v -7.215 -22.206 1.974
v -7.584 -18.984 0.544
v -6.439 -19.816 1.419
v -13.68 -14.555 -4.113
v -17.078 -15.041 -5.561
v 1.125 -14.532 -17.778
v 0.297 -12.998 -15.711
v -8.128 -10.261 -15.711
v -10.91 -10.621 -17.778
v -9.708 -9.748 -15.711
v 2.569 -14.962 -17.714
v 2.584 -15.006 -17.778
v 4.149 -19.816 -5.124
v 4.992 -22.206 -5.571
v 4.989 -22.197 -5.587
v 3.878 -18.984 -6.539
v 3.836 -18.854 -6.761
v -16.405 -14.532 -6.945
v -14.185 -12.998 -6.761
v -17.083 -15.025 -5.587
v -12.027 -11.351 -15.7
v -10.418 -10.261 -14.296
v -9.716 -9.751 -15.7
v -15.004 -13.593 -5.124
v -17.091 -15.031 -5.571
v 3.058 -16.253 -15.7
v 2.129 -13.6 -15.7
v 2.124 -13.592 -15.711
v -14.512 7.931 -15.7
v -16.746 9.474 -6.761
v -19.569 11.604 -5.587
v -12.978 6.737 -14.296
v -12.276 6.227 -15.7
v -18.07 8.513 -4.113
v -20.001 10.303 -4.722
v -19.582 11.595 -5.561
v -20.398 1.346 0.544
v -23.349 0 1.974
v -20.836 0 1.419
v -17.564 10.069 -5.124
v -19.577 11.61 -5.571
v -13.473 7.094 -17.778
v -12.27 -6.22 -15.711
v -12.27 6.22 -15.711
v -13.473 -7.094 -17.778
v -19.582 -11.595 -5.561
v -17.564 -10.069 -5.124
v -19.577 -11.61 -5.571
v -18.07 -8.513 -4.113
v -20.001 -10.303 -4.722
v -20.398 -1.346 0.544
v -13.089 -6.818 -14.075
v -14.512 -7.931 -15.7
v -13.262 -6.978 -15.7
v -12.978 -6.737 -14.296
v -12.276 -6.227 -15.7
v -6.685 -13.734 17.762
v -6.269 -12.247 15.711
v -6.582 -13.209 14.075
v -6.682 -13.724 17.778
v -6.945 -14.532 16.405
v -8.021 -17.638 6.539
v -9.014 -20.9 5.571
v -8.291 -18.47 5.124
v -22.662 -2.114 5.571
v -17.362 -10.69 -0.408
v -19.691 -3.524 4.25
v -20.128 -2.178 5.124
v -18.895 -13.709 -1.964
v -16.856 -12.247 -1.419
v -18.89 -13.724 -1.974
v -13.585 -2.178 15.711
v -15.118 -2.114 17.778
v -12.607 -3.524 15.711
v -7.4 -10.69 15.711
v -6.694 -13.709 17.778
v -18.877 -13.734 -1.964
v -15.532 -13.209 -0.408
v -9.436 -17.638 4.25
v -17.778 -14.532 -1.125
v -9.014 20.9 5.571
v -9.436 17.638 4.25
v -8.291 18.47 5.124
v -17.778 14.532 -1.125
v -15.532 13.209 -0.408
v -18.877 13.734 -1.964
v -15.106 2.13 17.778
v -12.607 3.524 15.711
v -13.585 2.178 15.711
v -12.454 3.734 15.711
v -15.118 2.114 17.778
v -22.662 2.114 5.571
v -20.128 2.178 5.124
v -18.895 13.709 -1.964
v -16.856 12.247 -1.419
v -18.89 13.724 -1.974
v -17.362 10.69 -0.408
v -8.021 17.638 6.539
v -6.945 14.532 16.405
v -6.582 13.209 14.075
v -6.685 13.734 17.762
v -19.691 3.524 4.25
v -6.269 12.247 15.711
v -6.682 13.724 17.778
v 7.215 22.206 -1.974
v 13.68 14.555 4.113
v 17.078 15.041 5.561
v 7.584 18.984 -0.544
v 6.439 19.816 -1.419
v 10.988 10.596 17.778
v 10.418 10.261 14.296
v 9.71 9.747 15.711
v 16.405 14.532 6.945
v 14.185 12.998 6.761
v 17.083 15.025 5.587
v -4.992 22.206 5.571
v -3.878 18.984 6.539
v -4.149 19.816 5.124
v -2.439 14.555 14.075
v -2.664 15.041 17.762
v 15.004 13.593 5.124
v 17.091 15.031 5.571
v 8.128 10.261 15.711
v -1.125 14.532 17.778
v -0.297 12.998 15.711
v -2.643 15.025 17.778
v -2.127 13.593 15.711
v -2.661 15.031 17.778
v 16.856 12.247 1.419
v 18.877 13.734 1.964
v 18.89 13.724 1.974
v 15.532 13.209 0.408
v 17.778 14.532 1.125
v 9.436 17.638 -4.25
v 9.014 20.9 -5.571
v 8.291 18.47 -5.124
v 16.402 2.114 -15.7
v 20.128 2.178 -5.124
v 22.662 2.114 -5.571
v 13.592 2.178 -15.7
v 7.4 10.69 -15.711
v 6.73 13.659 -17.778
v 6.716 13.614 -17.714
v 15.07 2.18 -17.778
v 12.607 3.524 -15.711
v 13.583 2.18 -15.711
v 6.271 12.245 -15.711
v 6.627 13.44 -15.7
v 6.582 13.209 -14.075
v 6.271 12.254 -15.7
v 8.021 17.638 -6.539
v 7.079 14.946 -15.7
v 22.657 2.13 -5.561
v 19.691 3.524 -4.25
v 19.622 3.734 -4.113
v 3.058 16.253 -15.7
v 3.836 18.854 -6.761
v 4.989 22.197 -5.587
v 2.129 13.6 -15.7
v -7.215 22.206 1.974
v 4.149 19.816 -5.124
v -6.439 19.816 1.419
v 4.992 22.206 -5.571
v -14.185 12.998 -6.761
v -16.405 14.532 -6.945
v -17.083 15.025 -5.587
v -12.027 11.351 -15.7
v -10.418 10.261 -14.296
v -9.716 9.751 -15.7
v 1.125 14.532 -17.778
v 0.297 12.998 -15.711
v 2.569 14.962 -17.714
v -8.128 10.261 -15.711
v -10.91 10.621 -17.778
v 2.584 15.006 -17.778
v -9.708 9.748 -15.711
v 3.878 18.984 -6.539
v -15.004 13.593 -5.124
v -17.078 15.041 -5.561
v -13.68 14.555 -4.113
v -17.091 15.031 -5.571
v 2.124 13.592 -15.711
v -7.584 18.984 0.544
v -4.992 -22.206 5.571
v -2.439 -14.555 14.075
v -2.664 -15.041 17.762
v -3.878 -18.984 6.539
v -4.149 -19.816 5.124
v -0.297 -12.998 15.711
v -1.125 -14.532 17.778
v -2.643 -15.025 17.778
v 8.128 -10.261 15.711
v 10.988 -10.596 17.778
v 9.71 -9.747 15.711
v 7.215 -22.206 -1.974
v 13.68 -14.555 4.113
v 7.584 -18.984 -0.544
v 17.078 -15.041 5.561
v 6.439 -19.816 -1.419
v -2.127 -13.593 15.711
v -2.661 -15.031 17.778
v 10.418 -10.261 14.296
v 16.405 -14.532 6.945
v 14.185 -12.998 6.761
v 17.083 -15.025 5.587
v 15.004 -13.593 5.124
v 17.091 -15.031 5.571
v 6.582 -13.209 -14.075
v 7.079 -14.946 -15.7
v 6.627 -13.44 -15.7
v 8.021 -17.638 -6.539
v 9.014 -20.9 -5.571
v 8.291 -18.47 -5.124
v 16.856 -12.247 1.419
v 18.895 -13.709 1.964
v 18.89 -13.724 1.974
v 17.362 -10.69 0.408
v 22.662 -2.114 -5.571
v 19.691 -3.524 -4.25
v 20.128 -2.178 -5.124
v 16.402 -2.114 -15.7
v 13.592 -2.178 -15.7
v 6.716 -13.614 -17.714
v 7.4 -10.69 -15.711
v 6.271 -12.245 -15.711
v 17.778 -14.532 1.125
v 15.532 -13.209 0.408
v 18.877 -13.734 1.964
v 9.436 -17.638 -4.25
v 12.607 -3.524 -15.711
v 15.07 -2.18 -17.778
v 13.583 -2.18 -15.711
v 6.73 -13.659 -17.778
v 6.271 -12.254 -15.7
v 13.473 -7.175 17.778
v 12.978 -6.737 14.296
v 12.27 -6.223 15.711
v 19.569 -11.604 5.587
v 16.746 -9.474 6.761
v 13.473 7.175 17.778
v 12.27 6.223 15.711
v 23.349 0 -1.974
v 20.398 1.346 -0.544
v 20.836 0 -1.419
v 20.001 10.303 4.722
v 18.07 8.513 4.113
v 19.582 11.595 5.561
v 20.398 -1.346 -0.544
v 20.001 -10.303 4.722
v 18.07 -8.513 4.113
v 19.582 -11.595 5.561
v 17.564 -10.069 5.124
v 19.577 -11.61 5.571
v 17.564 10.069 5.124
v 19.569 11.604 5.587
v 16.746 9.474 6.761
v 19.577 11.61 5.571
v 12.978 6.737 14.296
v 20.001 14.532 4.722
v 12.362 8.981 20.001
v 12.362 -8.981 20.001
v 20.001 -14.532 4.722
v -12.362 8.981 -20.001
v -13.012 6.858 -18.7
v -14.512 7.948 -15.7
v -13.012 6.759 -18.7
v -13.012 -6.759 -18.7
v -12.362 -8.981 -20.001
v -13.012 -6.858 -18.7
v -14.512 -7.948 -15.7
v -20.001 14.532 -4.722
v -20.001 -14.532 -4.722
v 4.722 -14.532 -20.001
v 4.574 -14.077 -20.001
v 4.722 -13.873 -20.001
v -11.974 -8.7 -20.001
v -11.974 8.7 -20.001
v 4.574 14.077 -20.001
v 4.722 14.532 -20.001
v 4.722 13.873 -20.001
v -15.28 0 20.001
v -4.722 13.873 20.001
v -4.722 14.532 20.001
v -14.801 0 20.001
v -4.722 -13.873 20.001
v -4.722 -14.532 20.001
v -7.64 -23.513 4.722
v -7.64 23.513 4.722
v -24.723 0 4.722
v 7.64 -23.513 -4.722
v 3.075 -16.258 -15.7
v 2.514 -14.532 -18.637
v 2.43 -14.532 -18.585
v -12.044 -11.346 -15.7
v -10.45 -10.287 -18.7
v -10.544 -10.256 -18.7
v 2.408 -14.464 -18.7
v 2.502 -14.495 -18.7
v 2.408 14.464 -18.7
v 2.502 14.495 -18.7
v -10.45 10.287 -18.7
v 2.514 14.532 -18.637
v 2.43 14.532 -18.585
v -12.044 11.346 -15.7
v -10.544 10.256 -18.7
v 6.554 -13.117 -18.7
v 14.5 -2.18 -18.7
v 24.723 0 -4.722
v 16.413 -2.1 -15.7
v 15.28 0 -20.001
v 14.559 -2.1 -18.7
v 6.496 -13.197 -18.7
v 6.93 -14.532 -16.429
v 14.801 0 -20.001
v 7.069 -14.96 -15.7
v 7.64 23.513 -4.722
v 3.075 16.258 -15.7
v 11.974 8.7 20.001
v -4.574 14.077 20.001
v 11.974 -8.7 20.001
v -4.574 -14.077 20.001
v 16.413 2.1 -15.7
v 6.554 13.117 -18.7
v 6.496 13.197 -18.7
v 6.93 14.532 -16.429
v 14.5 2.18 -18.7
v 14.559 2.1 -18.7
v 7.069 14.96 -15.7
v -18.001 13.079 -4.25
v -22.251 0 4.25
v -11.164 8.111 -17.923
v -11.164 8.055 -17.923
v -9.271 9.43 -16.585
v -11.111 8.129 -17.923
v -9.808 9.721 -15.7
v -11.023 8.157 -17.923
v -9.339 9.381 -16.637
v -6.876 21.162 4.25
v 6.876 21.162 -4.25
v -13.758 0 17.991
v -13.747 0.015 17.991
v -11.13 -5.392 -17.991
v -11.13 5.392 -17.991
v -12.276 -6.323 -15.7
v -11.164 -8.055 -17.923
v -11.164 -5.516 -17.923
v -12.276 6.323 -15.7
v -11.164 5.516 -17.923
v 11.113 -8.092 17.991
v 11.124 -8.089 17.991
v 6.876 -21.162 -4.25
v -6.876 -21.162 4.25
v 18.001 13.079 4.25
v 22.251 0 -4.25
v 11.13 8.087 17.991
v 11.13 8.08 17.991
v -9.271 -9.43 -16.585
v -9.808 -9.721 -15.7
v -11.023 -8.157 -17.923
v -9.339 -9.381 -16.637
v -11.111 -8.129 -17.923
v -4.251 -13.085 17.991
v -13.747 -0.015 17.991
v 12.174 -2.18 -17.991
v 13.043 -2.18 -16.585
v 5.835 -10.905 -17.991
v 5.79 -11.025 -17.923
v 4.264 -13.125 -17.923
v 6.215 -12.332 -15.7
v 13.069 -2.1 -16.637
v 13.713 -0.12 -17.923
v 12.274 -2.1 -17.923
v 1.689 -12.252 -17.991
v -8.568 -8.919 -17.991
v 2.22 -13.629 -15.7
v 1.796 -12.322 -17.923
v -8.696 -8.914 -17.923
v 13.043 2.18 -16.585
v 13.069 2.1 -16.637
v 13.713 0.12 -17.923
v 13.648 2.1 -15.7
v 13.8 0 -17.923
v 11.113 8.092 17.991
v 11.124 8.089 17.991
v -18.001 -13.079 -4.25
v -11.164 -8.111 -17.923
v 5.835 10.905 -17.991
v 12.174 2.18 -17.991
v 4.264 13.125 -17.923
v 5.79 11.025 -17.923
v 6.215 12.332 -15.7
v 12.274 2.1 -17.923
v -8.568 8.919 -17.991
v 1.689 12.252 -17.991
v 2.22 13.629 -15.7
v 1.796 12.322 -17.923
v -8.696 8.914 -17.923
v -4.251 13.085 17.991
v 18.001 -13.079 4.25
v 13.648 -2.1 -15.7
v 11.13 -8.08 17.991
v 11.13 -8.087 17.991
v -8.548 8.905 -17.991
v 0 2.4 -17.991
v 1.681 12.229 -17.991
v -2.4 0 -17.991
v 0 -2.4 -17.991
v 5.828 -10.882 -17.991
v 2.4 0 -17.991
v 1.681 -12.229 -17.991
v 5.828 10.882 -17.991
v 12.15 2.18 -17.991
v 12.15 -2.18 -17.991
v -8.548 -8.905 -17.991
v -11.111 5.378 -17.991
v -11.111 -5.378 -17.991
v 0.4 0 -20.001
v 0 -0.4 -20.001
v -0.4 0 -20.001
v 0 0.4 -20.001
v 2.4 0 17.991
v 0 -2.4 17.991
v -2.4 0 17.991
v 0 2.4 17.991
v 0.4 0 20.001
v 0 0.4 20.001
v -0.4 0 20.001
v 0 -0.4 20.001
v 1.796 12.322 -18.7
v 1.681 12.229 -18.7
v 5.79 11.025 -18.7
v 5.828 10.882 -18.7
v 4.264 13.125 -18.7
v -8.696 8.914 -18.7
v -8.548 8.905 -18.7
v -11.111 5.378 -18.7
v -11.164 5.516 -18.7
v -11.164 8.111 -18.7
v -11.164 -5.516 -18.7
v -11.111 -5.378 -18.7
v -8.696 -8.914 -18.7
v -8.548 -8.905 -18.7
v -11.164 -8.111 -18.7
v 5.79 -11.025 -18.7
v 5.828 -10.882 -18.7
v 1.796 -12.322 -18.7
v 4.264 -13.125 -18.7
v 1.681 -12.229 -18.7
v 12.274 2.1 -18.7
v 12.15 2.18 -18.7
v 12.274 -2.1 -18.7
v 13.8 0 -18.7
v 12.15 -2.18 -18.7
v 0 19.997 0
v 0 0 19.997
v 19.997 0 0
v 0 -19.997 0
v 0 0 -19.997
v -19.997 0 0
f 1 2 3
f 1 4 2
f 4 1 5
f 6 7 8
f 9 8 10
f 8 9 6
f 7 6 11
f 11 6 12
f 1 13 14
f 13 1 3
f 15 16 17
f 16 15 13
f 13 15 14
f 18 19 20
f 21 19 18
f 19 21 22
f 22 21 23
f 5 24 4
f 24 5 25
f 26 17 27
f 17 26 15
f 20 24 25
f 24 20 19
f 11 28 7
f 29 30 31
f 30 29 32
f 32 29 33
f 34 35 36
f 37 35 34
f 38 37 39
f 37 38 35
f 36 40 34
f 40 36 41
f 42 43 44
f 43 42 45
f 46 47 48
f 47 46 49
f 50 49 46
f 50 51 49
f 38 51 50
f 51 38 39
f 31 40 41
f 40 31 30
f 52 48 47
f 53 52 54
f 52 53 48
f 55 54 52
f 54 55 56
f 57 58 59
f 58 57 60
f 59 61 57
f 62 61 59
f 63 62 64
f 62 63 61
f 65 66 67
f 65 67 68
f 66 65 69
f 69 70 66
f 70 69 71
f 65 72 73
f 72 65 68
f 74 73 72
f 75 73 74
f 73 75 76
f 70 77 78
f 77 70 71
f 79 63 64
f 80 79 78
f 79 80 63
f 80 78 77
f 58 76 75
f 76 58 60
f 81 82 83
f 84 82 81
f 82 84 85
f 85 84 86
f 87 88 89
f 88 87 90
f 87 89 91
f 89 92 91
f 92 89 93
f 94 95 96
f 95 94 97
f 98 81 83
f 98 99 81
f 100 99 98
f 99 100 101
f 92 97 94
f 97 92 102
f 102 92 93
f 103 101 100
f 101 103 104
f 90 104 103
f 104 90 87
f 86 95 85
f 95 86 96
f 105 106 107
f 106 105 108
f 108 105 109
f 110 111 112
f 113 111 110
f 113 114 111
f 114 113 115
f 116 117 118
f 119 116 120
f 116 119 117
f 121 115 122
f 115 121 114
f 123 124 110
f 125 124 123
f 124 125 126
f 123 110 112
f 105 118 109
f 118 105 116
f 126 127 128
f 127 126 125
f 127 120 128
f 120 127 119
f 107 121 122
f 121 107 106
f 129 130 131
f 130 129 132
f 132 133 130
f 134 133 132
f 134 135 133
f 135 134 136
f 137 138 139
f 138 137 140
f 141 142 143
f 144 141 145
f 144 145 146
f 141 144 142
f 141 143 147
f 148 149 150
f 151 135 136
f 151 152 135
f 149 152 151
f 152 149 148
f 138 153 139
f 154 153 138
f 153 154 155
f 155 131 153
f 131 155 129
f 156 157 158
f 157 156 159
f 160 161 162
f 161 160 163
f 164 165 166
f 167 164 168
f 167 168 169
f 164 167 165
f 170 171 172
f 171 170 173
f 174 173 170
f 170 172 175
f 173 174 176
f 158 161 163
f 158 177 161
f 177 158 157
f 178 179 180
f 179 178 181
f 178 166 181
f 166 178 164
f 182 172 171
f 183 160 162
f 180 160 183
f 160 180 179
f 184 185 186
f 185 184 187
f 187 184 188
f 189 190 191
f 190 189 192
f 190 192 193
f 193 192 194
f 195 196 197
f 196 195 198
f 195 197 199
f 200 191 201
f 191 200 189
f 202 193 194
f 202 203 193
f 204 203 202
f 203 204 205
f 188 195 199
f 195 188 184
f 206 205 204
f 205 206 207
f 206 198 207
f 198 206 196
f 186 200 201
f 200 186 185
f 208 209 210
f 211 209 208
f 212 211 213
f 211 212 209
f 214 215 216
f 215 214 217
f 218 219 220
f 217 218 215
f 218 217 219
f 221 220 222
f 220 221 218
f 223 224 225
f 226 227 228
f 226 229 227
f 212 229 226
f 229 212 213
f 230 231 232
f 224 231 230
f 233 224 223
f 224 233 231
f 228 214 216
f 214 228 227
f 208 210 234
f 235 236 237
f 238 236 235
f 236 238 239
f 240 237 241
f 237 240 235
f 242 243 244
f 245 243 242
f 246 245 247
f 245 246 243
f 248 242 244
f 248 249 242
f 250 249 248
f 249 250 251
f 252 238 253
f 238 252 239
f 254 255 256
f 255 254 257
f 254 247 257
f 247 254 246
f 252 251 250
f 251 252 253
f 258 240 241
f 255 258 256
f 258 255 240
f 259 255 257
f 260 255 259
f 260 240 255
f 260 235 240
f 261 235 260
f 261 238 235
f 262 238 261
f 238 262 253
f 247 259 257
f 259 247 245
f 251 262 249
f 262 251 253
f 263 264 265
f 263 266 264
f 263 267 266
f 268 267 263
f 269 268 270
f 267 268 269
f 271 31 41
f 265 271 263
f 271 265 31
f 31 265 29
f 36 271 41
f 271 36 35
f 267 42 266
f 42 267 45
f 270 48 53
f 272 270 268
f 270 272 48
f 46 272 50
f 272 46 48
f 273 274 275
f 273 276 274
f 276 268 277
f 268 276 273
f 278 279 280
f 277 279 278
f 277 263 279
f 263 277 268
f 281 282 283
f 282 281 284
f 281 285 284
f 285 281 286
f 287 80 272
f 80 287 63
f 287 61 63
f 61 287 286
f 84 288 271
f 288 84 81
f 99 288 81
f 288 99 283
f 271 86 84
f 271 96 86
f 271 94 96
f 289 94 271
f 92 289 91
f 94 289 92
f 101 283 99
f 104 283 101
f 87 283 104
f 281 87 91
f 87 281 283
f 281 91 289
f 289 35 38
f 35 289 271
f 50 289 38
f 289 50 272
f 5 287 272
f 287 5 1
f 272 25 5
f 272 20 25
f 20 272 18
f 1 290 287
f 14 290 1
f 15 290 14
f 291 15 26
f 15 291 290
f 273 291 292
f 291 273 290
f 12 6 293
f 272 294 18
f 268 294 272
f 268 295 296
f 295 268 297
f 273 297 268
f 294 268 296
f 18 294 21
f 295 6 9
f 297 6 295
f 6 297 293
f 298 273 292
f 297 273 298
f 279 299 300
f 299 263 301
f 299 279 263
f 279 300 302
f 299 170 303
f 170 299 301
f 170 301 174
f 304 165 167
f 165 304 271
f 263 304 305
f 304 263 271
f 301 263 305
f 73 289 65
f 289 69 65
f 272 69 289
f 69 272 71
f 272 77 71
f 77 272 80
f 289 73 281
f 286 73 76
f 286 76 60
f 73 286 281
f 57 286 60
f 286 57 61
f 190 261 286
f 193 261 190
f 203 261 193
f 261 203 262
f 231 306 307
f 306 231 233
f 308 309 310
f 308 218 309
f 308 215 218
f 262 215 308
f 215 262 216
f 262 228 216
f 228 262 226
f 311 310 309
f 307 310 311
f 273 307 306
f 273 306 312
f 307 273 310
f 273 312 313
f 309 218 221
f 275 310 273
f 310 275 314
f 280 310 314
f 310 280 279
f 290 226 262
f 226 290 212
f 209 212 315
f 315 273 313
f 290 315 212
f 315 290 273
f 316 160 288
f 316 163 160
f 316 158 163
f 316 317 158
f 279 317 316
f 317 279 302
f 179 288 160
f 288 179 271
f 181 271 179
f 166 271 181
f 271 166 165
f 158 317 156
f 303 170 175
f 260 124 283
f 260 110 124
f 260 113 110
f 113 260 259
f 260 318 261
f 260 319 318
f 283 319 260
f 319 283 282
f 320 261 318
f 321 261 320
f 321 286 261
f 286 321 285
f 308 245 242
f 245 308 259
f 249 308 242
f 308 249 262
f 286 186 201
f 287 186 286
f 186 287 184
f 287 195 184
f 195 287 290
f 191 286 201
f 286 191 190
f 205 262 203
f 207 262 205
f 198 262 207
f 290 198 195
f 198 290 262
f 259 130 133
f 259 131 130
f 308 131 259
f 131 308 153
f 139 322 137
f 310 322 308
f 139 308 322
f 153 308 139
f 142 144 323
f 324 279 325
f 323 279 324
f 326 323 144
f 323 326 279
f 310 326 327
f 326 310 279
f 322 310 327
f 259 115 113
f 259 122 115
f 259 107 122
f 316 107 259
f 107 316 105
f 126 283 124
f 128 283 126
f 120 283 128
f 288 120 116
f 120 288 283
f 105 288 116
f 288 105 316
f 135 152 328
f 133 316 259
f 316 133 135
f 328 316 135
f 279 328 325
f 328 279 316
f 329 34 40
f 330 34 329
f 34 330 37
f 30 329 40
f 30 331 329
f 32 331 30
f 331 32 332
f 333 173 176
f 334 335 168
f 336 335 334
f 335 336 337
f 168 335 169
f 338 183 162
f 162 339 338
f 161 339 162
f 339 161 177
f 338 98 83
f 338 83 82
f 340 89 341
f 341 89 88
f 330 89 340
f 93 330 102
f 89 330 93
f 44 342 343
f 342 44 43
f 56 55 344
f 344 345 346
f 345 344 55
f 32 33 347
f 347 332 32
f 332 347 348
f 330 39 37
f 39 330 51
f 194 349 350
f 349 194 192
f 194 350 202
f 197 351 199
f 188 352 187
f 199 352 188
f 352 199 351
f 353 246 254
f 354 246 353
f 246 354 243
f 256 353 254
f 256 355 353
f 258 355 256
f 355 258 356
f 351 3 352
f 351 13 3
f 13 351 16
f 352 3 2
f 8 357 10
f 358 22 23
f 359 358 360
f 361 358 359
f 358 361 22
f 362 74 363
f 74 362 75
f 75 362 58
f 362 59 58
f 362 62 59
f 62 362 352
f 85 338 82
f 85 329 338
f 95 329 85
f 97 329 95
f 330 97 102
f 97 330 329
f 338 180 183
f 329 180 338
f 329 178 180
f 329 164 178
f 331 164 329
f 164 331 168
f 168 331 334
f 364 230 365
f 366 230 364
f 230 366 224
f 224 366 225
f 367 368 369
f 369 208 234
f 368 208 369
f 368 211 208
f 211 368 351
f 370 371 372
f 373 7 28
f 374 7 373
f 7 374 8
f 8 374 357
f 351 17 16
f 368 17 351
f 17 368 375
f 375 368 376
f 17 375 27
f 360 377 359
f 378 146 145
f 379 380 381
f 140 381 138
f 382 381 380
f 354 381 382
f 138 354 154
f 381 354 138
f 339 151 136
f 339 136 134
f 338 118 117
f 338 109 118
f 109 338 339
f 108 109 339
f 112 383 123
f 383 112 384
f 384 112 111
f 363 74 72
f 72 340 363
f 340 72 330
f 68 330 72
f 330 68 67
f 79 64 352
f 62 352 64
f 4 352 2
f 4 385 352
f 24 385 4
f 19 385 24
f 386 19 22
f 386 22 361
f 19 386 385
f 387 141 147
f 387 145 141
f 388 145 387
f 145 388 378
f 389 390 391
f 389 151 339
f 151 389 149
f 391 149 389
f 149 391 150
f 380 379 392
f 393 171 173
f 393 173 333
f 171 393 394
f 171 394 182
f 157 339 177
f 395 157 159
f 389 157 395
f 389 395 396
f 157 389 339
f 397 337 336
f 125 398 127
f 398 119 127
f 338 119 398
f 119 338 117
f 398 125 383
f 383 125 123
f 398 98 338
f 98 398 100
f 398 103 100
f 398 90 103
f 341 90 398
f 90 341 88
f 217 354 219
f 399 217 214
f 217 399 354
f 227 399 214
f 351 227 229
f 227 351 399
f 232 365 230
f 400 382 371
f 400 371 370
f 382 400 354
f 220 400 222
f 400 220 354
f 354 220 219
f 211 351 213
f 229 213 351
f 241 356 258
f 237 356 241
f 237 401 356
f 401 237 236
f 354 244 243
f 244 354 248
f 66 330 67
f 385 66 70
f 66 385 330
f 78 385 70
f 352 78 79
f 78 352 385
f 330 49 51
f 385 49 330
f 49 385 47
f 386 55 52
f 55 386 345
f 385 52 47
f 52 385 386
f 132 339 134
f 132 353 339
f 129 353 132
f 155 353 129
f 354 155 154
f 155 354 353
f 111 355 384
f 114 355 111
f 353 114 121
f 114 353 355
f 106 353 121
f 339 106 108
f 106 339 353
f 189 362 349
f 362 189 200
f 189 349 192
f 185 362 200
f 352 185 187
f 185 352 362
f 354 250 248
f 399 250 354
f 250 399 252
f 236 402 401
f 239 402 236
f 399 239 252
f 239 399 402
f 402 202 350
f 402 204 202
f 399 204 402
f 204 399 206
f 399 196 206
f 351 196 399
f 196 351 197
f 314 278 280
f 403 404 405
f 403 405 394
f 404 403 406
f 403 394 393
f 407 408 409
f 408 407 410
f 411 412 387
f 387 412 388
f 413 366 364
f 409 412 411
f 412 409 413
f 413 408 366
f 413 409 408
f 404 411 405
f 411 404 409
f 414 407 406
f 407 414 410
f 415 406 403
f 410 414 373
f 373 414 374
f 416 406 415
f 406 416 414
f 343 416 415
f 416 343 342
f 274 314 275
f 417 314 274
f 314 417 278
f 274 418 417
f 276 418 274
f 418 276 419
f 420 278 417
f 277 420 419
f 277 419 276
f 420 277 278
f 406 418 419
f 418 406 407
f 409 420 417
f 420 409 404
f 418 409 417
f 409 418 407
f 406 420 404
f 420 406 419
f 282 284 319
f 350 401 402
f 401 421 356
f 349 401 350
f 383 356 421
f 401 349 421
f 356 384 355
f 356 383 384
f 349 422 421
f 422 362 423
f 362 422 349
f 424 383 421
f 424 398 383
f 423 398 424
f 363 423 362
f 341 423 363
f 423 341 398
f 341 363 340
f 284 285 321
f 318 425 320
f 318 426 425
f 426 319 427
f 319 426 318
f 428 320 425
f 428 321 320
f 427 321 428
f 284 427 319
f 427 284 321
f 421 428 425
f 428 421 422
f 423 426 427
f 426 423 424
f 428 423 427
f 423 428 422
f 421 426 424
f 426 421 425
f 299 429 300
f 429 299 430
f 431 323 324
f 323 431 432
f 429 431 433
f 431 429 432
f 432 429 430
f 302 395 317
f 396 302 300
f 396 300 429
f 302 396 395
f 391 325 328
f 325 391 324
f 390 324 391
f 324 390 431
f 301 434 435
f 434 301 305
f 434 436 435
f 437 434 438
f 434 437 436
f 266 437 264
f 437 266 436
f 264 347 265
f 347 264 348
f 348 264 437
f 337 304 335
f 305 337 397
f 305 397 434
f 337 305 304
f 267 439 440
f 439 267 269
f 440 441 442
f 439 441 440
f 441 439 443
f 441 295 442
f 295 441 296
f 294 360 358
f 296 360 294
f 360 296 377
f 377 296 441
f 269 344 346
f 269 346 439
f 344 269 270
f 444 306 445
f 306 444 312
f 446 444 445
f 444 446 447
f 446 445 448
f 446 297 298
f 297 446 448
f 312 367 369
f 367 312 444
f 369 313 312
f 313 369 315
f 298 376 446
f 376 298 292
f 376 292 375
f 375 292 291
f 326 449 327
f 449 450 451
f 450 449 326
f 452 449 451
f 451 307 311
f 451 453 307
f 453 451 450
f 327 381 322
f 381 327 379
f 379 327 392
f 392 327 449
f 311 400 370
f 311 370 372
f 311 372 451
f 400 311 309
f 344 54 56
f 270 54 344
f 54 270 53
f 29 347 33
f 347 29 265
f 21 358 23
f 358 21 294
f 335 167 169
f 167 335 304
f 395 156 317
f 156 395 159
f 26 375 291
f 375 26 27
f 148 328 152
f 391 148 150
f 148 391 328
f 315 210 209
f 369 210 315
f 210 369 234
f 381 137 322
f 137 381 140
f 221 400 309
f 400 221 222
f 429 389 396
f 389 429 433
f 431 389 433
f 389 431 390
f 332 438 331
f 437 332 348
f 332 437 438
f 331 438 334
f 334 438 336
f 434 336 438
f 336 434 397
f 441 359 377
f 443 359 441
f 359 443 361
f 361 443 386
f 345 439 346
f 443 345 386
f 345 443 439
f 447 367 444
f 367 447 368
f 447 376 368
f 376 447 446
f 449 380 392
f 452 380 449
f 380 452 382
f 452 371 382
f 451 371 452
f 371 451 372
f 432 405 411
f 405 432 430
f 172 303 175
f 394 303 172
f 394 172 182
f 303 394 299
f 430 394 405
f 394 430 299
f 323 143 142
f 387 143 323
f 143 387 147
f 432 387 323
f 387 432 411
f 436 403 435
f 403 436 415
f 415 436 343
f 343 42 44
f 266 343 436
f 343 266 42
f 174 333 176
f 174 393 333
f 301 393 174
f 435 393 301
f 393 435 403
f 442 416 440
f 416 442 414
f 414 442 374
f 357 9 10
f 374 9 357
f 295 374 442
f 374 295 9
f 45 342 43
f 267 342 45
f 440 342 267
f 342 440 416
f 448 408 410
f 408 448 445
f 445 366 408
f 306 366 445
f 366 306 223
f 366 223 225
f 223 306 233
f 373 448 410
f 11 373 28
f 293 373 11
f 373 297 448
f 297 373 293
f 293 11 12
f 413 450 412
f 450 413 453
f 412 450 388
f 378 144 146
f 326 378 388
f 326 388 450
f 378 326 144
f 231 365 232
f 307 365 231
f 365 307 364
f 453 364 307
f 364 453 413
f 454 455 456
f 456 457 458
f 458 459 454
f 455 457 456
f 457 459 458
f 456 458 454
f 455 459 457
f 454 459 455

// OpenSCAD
arete = 28.28;
paroi = 1.5;
echelleReductionAjustementBouchon = 0.965;
r = 0.19; // résolution d'impression sur l'axe Z
octa_sch = [3,4];
Cpi = 3.14159;
Cphi = (1+sqrt(5))/2;
Cepsilon = 0.00000001;

function octa_ext_radius(a) = 
    a/2*(sqrt(2));
    
function octa_int_radius(a) = 
    a/6*sqrt(6);
    
function octa_arete_from(radius) = 
    radius*6/sqrt(6);
    
externalRadius = octa_ext_radius(arete);
internalRadius = octa_ext_radius(
                    octa_arete_from(
                        octa_int_radius(arete)-paroi));
                        
echo(externalRadius);
echo(internalRadius);

rotate([-45, 0, 0])
rotate([0, -90+plat_dihedral(octa_sch)/2, 0])
    octahedron(externalRadius);
//octa_creux();
//decoupe_bouchon();
//corps_ouvert();
//bouchon();
//trou();
dode_top();
dode_bottom();

module corps_ouvert() {
	difference() {
		octa_creux();
		decoupe_bouchon();
	}
}

module bouchon() {
//    rotate([180, 0, 0])
	scale([echelleReductionAjustementBouchon, echelleReductionAjustementBouchon, 0.995])
	difference () {
        intersection() {
            octa_creux();
            decoupe_bouchon(echelleReductionAjustementBouchon);
        }
	}
}

module octa_creux() {
	difference() {
        octahedron(externalRadius);
        octahedron(internalRadius);
	}
}

module decoupe_bouchon(scale=1) {
    distance = octa_int_radius(arete);
	rotate([0,0,60]) translate([0,0, distance])
		cylinder(paroi, r=arete*0.545, $fn=3, center=true);
	rotate([0,0,60]) translate([0,0, distance-paroi+0.4])
		cylinder(paroi-0.4, r=(arete-paroi)*0.523, $fn=3, center=true);
}


module octahedron(rad) {
    // create an instance of a spherical coordinate
    // long - rotation around z -axis
    // lat - latitude, starting at 0 == 'north pole'
    // rad - distance from center
    function sph(long, lat, rad=1) = [long, lat, rad];
    
    // Convert spherical to cartesian
    function sph_to_cart(s) = [
	clean(s[2]*sin(s[1])*cos(s[0])),  

	clean(s[2]*sin(s[1])*sin(s[0])),

	clean(s[2]*cos(s[1]))
	];

    function sphu_from_cart(c, rad=1) = sph(
        atan2(c[1],c[0]), 
        atan2(sqrt(c[0]*c[0]+c[1]*c[1]), c[2]), 
        rad
        );

    octa_cart = [
        [+1, 0, 0],  // + x axis
        [-1, 0, 0],	// - x axis
        [0, +1, 0],	// + y axis
        [0, -1, 0],	// - y axis
        [0, 0, +1],	// + z axis
        [0, 0, -1] 	// - z axis
    ];

    function octa_unit(rad=1) = [
        sph_to_cart(sphu_from_cart(octa_cart[0], rad)), 
        sph_to_cart(sphu_from_cart(octa_cart[1], rad)),
        sph_to_cart(sphu_from_cart(octa_cart[2], rad)),
        sph_to_cart(sphu_from_cart(octa_cart[3], rad)),
        sph_to_cart(sphu_from_cart(octa_cart[4], rad)), 
        sph_to_cart(sphu_from_cart(octa_cart[5], rad)), 
        ];

    octafaces = [
        [4,2,0],
        [4,0,3],
        [4,3,1],
        [4,1,2],
        [5,0,2],
        [5,3,0],
        [5,1,3],
        [5,2,1]
        ];

    octa_edges = [
        [0,2], 
        [0,3],
        [0,4],
        [0,5],
        [1,2],
        [1,3],
        [1,4],
        [1,5],
        [2,4], 
        [2,5],
        [3,4],
        [3,5],
        ];

    function octahedron(rad=1) = [octa_unit(rad), octafaces, octa_edges];

    rotate([0, 90-plat_dihedral(octa_sch)/2, 0])
    rotate([45, 0, 0])
    polyhedron(octa_unit(rad), faces=octafaces);
}
//translate([0, 0, -17.7])
//cylinder(5,40,40);

function clean(n) = (n < 0) ? ((n < -Cepsilon) ? n : 0) : 
	(n < Cepsilon) ? 0 : n; 

function plat_dihedral(pq) = 2 * asin( cos(180/pq[1])/sin(180/pq[0]));

function plat_circumradius(pq, a) = 
	(a/2)*
	tan(Cpi/pq[1])*
	tan(plat_dihedral(pq)/2);

function plat_midradius(pq, a) = 
	(a/2)*
	cos(Cpi/pq[0])*
	tan(plat_dihedral(pq)/2);

function plat_inradius(pq,a) = 
	a/(2*tan(Cpi/pq[0]))*
	sqrt((1-cos(plat_dihedral(pq)))/(1+cos(plat_dihedral(pq))));

function plat_a_from_inradius(pq, inradius) =
    inradius*(2*tan(Cpi/pq[0]))/
	sqrt((1-cos(plat_dihedral(pq)))/(1+cos(plat_dihedral(pq))));




// Dodecahedron

// base coordinates
// source:  http://dmccooey.com/polyhedra/Dodecahedron.txt
// generated by  http://kitwallace.co.uk/3d/solid-to-scad.xq
Name = "Dodecahedron";
// 5 sided faces = 12
C0 = 0.809016994374947424102293417183;
C1 = 1.30901699437494742410229341718;
points = [
[ 0.0,  0.5,   C1],
[ 0.0,  0.5,  -C1],
[ 0.0, -0.5,   C1],
[ 0.0, -0.5,  -C1],
[  C1,  0.0,  0.5],
[  C1,  0.0, -0.5],
[ -C1,  0.0,  0.5],
[ -C1,  0.0, -0.5],
[ 0.5,   C1,  0.0],
[ 0.5,  -C1,  0.0],
[-0.5,   C1,  0.0],
[-0.5,  -C1,  0.0],
[  C0,   C0,   C0],
[  C0,   C0,  -C0],
[  C0,  -C0,   C0],
[  C0,  -C0,  -C0],
[ -C0,   C0,   C0],
[ -C0,   C0,  -C0],
[ -C0,  -C0,   C0],
[ -C0,  -C0,  -C0]];
faces = [
[ 12 ,  4, 14,  2,  0],
[ 16 , 10,  8, 12,  0],
[  2 , 18,  6, 16,  0],
[ 17 , 10, 16,  6,  7],
[ 19 ,  3,  1, 17,  7],
[  6 , 18, 11, 19,  7],
[ 15 ,  3, 19, 11,  9],
[ 14 ,  4,  5, 15,  9],
[ 11 , 18,  2, 14,  9],
[  8 , 10, 17,  1, 13],
[  5 ,  4, 12,  8, 13],
[  1 ,  3, 15,  5, 13]];
edges = [
[4,12],
[4,14],
[2,14],
[0,2],
[0,12],
[10,16],
[8,10],
[8,12],
[0,16],
[2,18],
[6,18],
[6,16],
[10,17],
[6,7],
[7,17],
[3,19],
[1,3],
[1,17],
[7,19],
[11,18],
[11,19],
[3,15],
[9,11],
[9,15],
[4,5],
[5,15],
[9,14],
[1,13],
[8,13],
[5,13]];
// --------------------------------- 


// cut holes out of shell
eps=0.02;
radius=25.17;
shell_ratio=0.1;
prism_base_ratio =0.8;
prism_height_ratio=0.42;
prism_scale=0.5;
nfaces = [];
scale=1;

//insert

spoints = normalize(centre_points(points),radius);
sfaces = lhs_faces(faces,spoints);
cfaces =  select_nsided_faces(sfaces,nfaces);

hauteur = radius_sphere_inscrite(arete_from_sphere_circonscrite(radius))*2;

module base() {
    rotate([0,0,0])
        translate([0,0,-hauteur/2])
    difference() {
        cylinder(r=hauteur*0.37, h=2.01, $fn=5, center=false);
        cylinder(r1=0.4, r2=2.4, h=2.01, $fn=4, center=false);
    }
}

module plafond() {
    rotate([0,180,0]) base();
}

module dode_construct() {
    difference() {
        polyhedron(spoints,sfaces);
        scale(1-shell_ratio) polyhedron(spoints,sfaces);
        face_prisms_in(cfaces,spoints,prism_base_ratio,prism_scale,prism_height_ratio);
    }
}

module dodecahedron() {
scale(scale)
translate([0, 0, -hauteur/2])
 place_on_largest_face(sfaces,spoints)
   dode_construct();
}

module assemblage_dode() {
    union() {
        dodecahedron();
        base();
        plafond();
    }
}
 
module dode_bottom() {
    difference() {        
        assemblage_dode();
        decoupe();
        plots(4.36, 8, 6);
    }
}
 
module dode_top() {
//    rotate([180,0,0])
    difference() {
        intersection() {        
            assemblage_dode();
            union() {
                decoupe();
                plots(4.2, 8, 6);
            }
        }
        for (i = [1:5]) {
          rotate([0, 0, 360/5*i])
            translate([11.3, 0, (-hauteur/2.548)-2.6]) rotate([0,0,0])
                cylinder(d1=5, d2=5, h=5, $fn=5, center=true);
        }
    }
}

module decoupe() {
    translate([0, 0, -hauteur/2.548])
        cylinder(h=666, d=666);
}

module plots(largeur, longueur, h) {
    for (i = [1:5]) {
      rotate([0, 0, 360/5*i])
        translate([16.15, 0, (-hauteur/2.548)-(h/2)]) rotate([0,0,0])
//            cylinder(d1=diam-cone, d2=diam, h=h, $fn=4, center=true);
            linear_extrude(height = 20, scale = 1)
                square([longueur, largeur], center = true);
    }
}

//decoupe();
//dode_top();
//dode_bottom();

function radius_sphere_inscrite(arete) =
    arete*sqrt(5/8+11/(8*sqrt(5)));

function arete_from_sphere_circonscrite(radius) =
    radius*4/(sqrt(3)+sqrt(15));

// ruler(10);

// functions for the construction of polyhedra
// chris wallace
// see http://kitwallace.tumblr.com/tagged/polyhedra for info


//  functions for creating the matrices for transforming a single point

function m_translate(v) = [ [1, 0, 0, 0],
                            [0, 1, 0, 0],
                            [0, 0, 1, 0],
                            [v.x, v.y, v.z, 1  ] ];
                            
function m_rotate(v) =  [ [1,  0,         0,        0],
                          [0,  cos(v.x),  sin(v.x), 0],
                          [0, -sin(v.x),  cos(v.x), 0],
                          [0,  0,         0,        1] ]
                      * [ [ cos(v.y), 0,  -sin(v.y), 0],
                          [0,         1,  0,        0],
                          [ sin(v.y), 0,  cos(v.y), 0],
                          [0,         0,  0,        1] ]
                      * [ [ cos(v.z),  sin(v.z), 0, 0],
                          [-sin(v.z),  cos(v.z), 0, 0],
                          [ 0,         0,        1, 0],
                          [ 0,         0,        0, 1] ];
                            
function vec3(v) = [v.x, v.y, v.z];
function transform(v, m)  = vec3([v.x, v.y, v.z, 1] * m);
                            
function matrix_to(p0, p) = 
                       m_rotate([0, atan2(sqrt(pow(p[0], 2) + pow(p[1], 2)), p[2]), 0]) 
                     * m_rotate([0, 0, atan2(p[1], p[0])]) 
                     * m_translate(p0);

function matrix_from(p0, p) = 
                      m_translate(-p0)
                      * m_rotate([0, 0, -atan2(p[1], p[0])]) 
                      * m_rotate([0, -atan2(sqrt(pow(p[0], 2) + pow(p[1], 2)), p[2]), 0]); 

function transform_points(list, matrix, i = 0) = 
    i < len(list) 
       ? concat([ transform(list[i], matrix) ], transform_points(list, matrix, i + 1))
       : [];


//  convert from point indexes to point coordinates

function as_points(indexes,points,i=0) =
     i < len(indexes) 
        ?  concat([points[indexes[i]]], as_points(indexes,points,i+1))
        : [];

//  basic vector functions
function normal_r(face) =
     cross(face[1]-face[0],face[2]-face[0]);

function normal(face) =
     - normal_r(face) / norm(normal_r(face));

function centre(points) = 
      vsum(points) / len(points);

// sum a list of vectors
function vsum(points,i=0) =  
      i < len(points)
        ?  (points[i] + vsum(points,i+1))
        :  [0,0,0];

function ssum(list,i=0) =  
      i < len(list)
        ?  (list[i] + ssum(list,i+1))
        :  0;


// add a vector to a list of vectors
function vadd(points,v,i=0) =
      i < len(points)
        ?  concat([points[i] + v], vadd(points,v,i+1))
        :  [];

function reverse_r(v,n) =
      n == 0 
        ? [v[0]]
        : concat([v[n]],reverse_r(v,n-1));

function reverse(v) = reverse_r(v, len(v)-1);

function sum_norm(points,i=0) =
    i < len(points)
       ?  norm(points[i]) + sum_norm(points,i+1)
       : 0 ;

function average_radius(points) =
       sum_norm(points) / len(points);


// select one dimension of a list of vectors
function slice(v,k,i=0) =
   i <len(v)
      ?  concat([v[i][k]], slice(v,k,i+1))
      : [];

function max(v, max=-9999999999999999,i=0) =
     i < len(v) 
        ?  v[i] > max 
            ?  max(v, v[i], i+1 )
            :  max(v, max, i+1 ) 
        : max;

function min(v, min=9999999999999999,i=0) =
     i < len(v) 
        ?  v[i] < min 
            ?  min(v, v[i], i+1 )
            :  min(v, min, i+1 ) 
        : min;

function project(pts,i=0) =
     i < len(pts)
        ? concat([[pts[i][0],pts[i][1]]], project(pts,i+1))
        : [];
        
function contains(n, list, i=0) =
     i < len(list) 
        ?  n == list[i]
           ?  true
           :  contains(n,list,i+1)
        : false;

// normalize the points to have origin at 0,0,0 
function centre_points(points) = 
     vadd(points, - centre(points));

//scale to average radius = radius
function normalize(points,radius) =
    points * radius /average_radius(points);
 
function select_nsided_faces(faces,nsides,i=0) =
  len(nsides) == 0
     ?  faces
     :  i < len(faces)
         ?  contains(len(faces[i]), nsides)
             ? concat([faces[i]],  select_nsided_faces(faces,nsides,i+1))
             : select_nsided_faces(faces,nsides,i+1)
         : [];
         
function longest_edge(face,max=-1,i=0) =
       i < len(face)
          ?  norm(face[i] - face[(i+1)% len(face)]) > max
             ?  longest_edge(face, norm(face[i] - face[(i+1)% len(face)]),i+1)
             :  longest_edge(face, max,i+1)
          : max ;

function point_edges(point,edges,i=0) =
    i < len(edges) 
       ? point == edges[i][0] || point == edges[i][1]
         ? concat([edges[i]], point_edges(point,edges,i+1))
         : point_edges(point,edges,i+1)
       : [];

function select_nedged_points(points,edges,nedges,i=0) =
     i < len(points) 
         ?  len(point_edges(i,edges)) == nedges
             ? concat([i],  select_nedged_points(points,edges,nedges,i+1))
             : select_nedged_points(points,edges,nedges,i+1)
         : [];

function triangle(a,b) = norm(cross(a,b))/2;

function face_area_centre(face,centre,i=0) =
    i < len(face)
       ?  triangle(
                face[i] - centre,
                face[(i+1) % len(face)] - centre)
          + face_area_centre(face,centre,i+1)
       : 0 ;

function face_area(face) = face_area_centre(face,centre(face));

function face_areas(faces,points,i=0) =
   i < len(faces)
      ? concat([[i,  face_area(as_points(faces[i],points))]] ,
               face_areas(faces,points,i+1))
      : [] ;
 
function max_area(areas, max=[-1,-1], i=0) =
   i <len(areas)
      ? areas[i][1] > max[1]
         ?  max_area(areas,areas[i],i+1)
         :  max_area(areas,max,i+1)
      : max;


function bbox(v) = [
   [min(slice(spoints,0)), max(slice(spoints,0))],
   [min(slice(spoints,1)), max(slice(spoints,1))],
   [min(slice(spoints,2)), max(slice(spoints,2))]
];

// check that all faces have a lhs orientation
function cosine_between(u, v) =(u * v) / (norm(u) * norm(v));

function lhs_faces(faces,points,i=0) =
     i < len(faces) 
        ?  cosine_between(normal(as_points(faces[i],points)),
                         centre(as_points(faces[i],points))) < 0
            ?  concat([reverse(faces[i])],lhs_faces(faces,points,i+1))
            :  concat([faces[i]],lhs_faces(faces,points,i+1))
        : [] ;


function fs(p) = f(p[0],p[1],p[2]);

function modulate_point(p) =
    spherical_to_xyz(fs(xyz_to_spherical(p)));

function modulate_points(points,i=0) =
   i < len(points)
      ? concat([modulate_point(points[i])],modulate_points(points,i+1))
      : [];

function xyz_to_spherical(p) =
    [ norm(p), acos(p.z/ norm(p)), atan2(p.x,p.y)] ;

function spherical_to_xyz_full(r,theta,phi) =
    [ r * sin(theta) * cos(phi),
      r * sin(theta) * sin(phi),
      r * cos(theta)];

function spherical_to_xyz(s) =
     spherical_to_xyz_full(s[0],s[1],s[2]);

function select_large_faces(faces,points, min,i=0) =
  i < len(faces)
     ?  face_area(as_points(faces[i],points)) > min
       ? concat([faces[i]],  select_large_faces(faces,points,min,i+1))
       :select_large_faces(faces,points,min,i+1)     
     : [];
        
function lower(char) =
    contains(char,"abcdefghijklmnopqrstuvwxyz") ;

function char_layer(char) =
    lower(char) 
         ? str(char,"_")
         : char;

module write_char(font,char) {
	linear_extrude(height=1,convexity=10) 
      import(file=str("write/",font,".dxf"),layer=char_layer(char));
};

module write_centred_char(font,char) {
	linear_extrude(height=1,convexity=10) 
      translate([-2.5,-4,0])
          import(file=str("write/",font,".dxf"),layer=char_layer(char));
};
module engrave_face_word(faces,points,word,font,ratio,thickness) {
    for (i=[0:len(faces) - 1]) {
      if (i <len(word)) {
        f = as_points(faces[i],points); 
        n = normal(f); c = centre(f);
        s = longest_edge(f) / 20* ratio;
           orient_to(c,n)  
                translate([0,0,-thickness+eps])
                     scale([s,s,thickness])
                          write_centred_char(font,word[i]);
      }
  }
}
                          
module orient_to(centre, normal) {   
      translate(centre)
      rotate([0, 0, atan2(normal[1], normal[0])]) //rotation
      rotate([0, atan2(sqrt(pow(normal[0], 2)+pow(normal[1], 2)),normal[2]), 0])
      children();
}

module orient_from(centre, normal) {   
      rotate([0, -atan2(sqrt(pow(normal[0], 2)+pow(normal[1], 2)),normal[2]), 0])
      rotate([0, 0, -atan2(normal[1], normal[0])]) //rotation
      translate(-centre)
      children();
}

module place_on_largest_face(faces,points) {
  largest = max_area(face_areas(faces,points));
  lpoints = as_points(faces[largest[0]],points);
  n = normal(lpoints); c = centre(lpoints);
  orient_from(c,-n)
  children();
}
              
module make_edge(edge, points, r) {
    p0 = points[edge[0]]; p1 = points[edge[1]];
    v = p1 -p0;
     orient_to(p0,v)
       cylinder(r=r, h=norm(v)); 
}

module make_edges(points, edges, r) {
   for (i =[0:len(edges)-1])
      make_edge(edges[i],points, r);
}

module make_vertices(points,r) { 
   for (i = [0:len(points)-1])
      translate(points[i]) sphere(r); 
}

module face_prism (face,prism_base_ratio,prism_scale,prism_height_ratio) {
    n = normal(face); c= centre(face);
    m = matrix_from(c,n);
    tpts =  prism_base_ratio * transform_points(face,m);
    max_length = longest_edge(face);
    xy = project(tpts);
      linear_extrude(height=prism_height_ratio * max_length, scale=prism_scale) 
          polygon(points=xy);
}

module face_prisms_in(faces,points,prism_base_ratio,prism_scale,prism_height_ratio) {
    for (i=[0:len(faces) - 1]) {
       f = as_points(faces[i],points); 
       n = normal(f); c = centre(f);
       orient_to(c,n) 
          translate([0,0,eps]) 
               mirror() rotate([0,180,0]) 
                   face_prism(f,prism_base_ratio,prism_scale,prism_height_ratio);
    }
}

module face_prisms_out(faces,points,prism_base_ratio,prism_scale,prism_height_ratio) {
    for (i=[0:len(faces) - 1])  {
       f = as_points(faces[i],points); 
       n = normal(f); c = centre(f);
       orient_to(c,n) 
          translate([0,0,-eps]) 
               face_prism(f,prism_base_ratio,prism_scale,prism_height_ratio);
    }
}

module face_prisms_through(faces,points,prism_base_ratio,prism_scale,prism_height_ratio) {
    for (i=[0:len(faces) - 1]) {
       f = as_points(faces[i],points); 
       n = normal(f); c = centre(f);
       orient_to(c,n) 
          translate([0,0,prism_height_ratio*longest_edge(f)/2]) 
               mirror() rotate([0,180,0]) 
                   face_prism(f,prism_base_ratio,prism_scale,prism_height_ratio);
    }
}
module ruler(n) {
   for (i=[0:n-1]) 
       translate([(i-n/2 +0.5)* 10,0,0]) cube([9.8,5,2], center=true);
}

module ground(size=50) {
   translate([0,0,-size]) cube(2*size,center=true);
}

module cross_section(size=50) {
   translate([0,0,-size]) cube(2*size);
}

module ring(radius,thickness,height) {
   difference() {
      cylinder(h=height,r=radius);
      translate([0,0,-eps]) cylinder(h=height+2*eps,r=radius - thickness);
   }
}
